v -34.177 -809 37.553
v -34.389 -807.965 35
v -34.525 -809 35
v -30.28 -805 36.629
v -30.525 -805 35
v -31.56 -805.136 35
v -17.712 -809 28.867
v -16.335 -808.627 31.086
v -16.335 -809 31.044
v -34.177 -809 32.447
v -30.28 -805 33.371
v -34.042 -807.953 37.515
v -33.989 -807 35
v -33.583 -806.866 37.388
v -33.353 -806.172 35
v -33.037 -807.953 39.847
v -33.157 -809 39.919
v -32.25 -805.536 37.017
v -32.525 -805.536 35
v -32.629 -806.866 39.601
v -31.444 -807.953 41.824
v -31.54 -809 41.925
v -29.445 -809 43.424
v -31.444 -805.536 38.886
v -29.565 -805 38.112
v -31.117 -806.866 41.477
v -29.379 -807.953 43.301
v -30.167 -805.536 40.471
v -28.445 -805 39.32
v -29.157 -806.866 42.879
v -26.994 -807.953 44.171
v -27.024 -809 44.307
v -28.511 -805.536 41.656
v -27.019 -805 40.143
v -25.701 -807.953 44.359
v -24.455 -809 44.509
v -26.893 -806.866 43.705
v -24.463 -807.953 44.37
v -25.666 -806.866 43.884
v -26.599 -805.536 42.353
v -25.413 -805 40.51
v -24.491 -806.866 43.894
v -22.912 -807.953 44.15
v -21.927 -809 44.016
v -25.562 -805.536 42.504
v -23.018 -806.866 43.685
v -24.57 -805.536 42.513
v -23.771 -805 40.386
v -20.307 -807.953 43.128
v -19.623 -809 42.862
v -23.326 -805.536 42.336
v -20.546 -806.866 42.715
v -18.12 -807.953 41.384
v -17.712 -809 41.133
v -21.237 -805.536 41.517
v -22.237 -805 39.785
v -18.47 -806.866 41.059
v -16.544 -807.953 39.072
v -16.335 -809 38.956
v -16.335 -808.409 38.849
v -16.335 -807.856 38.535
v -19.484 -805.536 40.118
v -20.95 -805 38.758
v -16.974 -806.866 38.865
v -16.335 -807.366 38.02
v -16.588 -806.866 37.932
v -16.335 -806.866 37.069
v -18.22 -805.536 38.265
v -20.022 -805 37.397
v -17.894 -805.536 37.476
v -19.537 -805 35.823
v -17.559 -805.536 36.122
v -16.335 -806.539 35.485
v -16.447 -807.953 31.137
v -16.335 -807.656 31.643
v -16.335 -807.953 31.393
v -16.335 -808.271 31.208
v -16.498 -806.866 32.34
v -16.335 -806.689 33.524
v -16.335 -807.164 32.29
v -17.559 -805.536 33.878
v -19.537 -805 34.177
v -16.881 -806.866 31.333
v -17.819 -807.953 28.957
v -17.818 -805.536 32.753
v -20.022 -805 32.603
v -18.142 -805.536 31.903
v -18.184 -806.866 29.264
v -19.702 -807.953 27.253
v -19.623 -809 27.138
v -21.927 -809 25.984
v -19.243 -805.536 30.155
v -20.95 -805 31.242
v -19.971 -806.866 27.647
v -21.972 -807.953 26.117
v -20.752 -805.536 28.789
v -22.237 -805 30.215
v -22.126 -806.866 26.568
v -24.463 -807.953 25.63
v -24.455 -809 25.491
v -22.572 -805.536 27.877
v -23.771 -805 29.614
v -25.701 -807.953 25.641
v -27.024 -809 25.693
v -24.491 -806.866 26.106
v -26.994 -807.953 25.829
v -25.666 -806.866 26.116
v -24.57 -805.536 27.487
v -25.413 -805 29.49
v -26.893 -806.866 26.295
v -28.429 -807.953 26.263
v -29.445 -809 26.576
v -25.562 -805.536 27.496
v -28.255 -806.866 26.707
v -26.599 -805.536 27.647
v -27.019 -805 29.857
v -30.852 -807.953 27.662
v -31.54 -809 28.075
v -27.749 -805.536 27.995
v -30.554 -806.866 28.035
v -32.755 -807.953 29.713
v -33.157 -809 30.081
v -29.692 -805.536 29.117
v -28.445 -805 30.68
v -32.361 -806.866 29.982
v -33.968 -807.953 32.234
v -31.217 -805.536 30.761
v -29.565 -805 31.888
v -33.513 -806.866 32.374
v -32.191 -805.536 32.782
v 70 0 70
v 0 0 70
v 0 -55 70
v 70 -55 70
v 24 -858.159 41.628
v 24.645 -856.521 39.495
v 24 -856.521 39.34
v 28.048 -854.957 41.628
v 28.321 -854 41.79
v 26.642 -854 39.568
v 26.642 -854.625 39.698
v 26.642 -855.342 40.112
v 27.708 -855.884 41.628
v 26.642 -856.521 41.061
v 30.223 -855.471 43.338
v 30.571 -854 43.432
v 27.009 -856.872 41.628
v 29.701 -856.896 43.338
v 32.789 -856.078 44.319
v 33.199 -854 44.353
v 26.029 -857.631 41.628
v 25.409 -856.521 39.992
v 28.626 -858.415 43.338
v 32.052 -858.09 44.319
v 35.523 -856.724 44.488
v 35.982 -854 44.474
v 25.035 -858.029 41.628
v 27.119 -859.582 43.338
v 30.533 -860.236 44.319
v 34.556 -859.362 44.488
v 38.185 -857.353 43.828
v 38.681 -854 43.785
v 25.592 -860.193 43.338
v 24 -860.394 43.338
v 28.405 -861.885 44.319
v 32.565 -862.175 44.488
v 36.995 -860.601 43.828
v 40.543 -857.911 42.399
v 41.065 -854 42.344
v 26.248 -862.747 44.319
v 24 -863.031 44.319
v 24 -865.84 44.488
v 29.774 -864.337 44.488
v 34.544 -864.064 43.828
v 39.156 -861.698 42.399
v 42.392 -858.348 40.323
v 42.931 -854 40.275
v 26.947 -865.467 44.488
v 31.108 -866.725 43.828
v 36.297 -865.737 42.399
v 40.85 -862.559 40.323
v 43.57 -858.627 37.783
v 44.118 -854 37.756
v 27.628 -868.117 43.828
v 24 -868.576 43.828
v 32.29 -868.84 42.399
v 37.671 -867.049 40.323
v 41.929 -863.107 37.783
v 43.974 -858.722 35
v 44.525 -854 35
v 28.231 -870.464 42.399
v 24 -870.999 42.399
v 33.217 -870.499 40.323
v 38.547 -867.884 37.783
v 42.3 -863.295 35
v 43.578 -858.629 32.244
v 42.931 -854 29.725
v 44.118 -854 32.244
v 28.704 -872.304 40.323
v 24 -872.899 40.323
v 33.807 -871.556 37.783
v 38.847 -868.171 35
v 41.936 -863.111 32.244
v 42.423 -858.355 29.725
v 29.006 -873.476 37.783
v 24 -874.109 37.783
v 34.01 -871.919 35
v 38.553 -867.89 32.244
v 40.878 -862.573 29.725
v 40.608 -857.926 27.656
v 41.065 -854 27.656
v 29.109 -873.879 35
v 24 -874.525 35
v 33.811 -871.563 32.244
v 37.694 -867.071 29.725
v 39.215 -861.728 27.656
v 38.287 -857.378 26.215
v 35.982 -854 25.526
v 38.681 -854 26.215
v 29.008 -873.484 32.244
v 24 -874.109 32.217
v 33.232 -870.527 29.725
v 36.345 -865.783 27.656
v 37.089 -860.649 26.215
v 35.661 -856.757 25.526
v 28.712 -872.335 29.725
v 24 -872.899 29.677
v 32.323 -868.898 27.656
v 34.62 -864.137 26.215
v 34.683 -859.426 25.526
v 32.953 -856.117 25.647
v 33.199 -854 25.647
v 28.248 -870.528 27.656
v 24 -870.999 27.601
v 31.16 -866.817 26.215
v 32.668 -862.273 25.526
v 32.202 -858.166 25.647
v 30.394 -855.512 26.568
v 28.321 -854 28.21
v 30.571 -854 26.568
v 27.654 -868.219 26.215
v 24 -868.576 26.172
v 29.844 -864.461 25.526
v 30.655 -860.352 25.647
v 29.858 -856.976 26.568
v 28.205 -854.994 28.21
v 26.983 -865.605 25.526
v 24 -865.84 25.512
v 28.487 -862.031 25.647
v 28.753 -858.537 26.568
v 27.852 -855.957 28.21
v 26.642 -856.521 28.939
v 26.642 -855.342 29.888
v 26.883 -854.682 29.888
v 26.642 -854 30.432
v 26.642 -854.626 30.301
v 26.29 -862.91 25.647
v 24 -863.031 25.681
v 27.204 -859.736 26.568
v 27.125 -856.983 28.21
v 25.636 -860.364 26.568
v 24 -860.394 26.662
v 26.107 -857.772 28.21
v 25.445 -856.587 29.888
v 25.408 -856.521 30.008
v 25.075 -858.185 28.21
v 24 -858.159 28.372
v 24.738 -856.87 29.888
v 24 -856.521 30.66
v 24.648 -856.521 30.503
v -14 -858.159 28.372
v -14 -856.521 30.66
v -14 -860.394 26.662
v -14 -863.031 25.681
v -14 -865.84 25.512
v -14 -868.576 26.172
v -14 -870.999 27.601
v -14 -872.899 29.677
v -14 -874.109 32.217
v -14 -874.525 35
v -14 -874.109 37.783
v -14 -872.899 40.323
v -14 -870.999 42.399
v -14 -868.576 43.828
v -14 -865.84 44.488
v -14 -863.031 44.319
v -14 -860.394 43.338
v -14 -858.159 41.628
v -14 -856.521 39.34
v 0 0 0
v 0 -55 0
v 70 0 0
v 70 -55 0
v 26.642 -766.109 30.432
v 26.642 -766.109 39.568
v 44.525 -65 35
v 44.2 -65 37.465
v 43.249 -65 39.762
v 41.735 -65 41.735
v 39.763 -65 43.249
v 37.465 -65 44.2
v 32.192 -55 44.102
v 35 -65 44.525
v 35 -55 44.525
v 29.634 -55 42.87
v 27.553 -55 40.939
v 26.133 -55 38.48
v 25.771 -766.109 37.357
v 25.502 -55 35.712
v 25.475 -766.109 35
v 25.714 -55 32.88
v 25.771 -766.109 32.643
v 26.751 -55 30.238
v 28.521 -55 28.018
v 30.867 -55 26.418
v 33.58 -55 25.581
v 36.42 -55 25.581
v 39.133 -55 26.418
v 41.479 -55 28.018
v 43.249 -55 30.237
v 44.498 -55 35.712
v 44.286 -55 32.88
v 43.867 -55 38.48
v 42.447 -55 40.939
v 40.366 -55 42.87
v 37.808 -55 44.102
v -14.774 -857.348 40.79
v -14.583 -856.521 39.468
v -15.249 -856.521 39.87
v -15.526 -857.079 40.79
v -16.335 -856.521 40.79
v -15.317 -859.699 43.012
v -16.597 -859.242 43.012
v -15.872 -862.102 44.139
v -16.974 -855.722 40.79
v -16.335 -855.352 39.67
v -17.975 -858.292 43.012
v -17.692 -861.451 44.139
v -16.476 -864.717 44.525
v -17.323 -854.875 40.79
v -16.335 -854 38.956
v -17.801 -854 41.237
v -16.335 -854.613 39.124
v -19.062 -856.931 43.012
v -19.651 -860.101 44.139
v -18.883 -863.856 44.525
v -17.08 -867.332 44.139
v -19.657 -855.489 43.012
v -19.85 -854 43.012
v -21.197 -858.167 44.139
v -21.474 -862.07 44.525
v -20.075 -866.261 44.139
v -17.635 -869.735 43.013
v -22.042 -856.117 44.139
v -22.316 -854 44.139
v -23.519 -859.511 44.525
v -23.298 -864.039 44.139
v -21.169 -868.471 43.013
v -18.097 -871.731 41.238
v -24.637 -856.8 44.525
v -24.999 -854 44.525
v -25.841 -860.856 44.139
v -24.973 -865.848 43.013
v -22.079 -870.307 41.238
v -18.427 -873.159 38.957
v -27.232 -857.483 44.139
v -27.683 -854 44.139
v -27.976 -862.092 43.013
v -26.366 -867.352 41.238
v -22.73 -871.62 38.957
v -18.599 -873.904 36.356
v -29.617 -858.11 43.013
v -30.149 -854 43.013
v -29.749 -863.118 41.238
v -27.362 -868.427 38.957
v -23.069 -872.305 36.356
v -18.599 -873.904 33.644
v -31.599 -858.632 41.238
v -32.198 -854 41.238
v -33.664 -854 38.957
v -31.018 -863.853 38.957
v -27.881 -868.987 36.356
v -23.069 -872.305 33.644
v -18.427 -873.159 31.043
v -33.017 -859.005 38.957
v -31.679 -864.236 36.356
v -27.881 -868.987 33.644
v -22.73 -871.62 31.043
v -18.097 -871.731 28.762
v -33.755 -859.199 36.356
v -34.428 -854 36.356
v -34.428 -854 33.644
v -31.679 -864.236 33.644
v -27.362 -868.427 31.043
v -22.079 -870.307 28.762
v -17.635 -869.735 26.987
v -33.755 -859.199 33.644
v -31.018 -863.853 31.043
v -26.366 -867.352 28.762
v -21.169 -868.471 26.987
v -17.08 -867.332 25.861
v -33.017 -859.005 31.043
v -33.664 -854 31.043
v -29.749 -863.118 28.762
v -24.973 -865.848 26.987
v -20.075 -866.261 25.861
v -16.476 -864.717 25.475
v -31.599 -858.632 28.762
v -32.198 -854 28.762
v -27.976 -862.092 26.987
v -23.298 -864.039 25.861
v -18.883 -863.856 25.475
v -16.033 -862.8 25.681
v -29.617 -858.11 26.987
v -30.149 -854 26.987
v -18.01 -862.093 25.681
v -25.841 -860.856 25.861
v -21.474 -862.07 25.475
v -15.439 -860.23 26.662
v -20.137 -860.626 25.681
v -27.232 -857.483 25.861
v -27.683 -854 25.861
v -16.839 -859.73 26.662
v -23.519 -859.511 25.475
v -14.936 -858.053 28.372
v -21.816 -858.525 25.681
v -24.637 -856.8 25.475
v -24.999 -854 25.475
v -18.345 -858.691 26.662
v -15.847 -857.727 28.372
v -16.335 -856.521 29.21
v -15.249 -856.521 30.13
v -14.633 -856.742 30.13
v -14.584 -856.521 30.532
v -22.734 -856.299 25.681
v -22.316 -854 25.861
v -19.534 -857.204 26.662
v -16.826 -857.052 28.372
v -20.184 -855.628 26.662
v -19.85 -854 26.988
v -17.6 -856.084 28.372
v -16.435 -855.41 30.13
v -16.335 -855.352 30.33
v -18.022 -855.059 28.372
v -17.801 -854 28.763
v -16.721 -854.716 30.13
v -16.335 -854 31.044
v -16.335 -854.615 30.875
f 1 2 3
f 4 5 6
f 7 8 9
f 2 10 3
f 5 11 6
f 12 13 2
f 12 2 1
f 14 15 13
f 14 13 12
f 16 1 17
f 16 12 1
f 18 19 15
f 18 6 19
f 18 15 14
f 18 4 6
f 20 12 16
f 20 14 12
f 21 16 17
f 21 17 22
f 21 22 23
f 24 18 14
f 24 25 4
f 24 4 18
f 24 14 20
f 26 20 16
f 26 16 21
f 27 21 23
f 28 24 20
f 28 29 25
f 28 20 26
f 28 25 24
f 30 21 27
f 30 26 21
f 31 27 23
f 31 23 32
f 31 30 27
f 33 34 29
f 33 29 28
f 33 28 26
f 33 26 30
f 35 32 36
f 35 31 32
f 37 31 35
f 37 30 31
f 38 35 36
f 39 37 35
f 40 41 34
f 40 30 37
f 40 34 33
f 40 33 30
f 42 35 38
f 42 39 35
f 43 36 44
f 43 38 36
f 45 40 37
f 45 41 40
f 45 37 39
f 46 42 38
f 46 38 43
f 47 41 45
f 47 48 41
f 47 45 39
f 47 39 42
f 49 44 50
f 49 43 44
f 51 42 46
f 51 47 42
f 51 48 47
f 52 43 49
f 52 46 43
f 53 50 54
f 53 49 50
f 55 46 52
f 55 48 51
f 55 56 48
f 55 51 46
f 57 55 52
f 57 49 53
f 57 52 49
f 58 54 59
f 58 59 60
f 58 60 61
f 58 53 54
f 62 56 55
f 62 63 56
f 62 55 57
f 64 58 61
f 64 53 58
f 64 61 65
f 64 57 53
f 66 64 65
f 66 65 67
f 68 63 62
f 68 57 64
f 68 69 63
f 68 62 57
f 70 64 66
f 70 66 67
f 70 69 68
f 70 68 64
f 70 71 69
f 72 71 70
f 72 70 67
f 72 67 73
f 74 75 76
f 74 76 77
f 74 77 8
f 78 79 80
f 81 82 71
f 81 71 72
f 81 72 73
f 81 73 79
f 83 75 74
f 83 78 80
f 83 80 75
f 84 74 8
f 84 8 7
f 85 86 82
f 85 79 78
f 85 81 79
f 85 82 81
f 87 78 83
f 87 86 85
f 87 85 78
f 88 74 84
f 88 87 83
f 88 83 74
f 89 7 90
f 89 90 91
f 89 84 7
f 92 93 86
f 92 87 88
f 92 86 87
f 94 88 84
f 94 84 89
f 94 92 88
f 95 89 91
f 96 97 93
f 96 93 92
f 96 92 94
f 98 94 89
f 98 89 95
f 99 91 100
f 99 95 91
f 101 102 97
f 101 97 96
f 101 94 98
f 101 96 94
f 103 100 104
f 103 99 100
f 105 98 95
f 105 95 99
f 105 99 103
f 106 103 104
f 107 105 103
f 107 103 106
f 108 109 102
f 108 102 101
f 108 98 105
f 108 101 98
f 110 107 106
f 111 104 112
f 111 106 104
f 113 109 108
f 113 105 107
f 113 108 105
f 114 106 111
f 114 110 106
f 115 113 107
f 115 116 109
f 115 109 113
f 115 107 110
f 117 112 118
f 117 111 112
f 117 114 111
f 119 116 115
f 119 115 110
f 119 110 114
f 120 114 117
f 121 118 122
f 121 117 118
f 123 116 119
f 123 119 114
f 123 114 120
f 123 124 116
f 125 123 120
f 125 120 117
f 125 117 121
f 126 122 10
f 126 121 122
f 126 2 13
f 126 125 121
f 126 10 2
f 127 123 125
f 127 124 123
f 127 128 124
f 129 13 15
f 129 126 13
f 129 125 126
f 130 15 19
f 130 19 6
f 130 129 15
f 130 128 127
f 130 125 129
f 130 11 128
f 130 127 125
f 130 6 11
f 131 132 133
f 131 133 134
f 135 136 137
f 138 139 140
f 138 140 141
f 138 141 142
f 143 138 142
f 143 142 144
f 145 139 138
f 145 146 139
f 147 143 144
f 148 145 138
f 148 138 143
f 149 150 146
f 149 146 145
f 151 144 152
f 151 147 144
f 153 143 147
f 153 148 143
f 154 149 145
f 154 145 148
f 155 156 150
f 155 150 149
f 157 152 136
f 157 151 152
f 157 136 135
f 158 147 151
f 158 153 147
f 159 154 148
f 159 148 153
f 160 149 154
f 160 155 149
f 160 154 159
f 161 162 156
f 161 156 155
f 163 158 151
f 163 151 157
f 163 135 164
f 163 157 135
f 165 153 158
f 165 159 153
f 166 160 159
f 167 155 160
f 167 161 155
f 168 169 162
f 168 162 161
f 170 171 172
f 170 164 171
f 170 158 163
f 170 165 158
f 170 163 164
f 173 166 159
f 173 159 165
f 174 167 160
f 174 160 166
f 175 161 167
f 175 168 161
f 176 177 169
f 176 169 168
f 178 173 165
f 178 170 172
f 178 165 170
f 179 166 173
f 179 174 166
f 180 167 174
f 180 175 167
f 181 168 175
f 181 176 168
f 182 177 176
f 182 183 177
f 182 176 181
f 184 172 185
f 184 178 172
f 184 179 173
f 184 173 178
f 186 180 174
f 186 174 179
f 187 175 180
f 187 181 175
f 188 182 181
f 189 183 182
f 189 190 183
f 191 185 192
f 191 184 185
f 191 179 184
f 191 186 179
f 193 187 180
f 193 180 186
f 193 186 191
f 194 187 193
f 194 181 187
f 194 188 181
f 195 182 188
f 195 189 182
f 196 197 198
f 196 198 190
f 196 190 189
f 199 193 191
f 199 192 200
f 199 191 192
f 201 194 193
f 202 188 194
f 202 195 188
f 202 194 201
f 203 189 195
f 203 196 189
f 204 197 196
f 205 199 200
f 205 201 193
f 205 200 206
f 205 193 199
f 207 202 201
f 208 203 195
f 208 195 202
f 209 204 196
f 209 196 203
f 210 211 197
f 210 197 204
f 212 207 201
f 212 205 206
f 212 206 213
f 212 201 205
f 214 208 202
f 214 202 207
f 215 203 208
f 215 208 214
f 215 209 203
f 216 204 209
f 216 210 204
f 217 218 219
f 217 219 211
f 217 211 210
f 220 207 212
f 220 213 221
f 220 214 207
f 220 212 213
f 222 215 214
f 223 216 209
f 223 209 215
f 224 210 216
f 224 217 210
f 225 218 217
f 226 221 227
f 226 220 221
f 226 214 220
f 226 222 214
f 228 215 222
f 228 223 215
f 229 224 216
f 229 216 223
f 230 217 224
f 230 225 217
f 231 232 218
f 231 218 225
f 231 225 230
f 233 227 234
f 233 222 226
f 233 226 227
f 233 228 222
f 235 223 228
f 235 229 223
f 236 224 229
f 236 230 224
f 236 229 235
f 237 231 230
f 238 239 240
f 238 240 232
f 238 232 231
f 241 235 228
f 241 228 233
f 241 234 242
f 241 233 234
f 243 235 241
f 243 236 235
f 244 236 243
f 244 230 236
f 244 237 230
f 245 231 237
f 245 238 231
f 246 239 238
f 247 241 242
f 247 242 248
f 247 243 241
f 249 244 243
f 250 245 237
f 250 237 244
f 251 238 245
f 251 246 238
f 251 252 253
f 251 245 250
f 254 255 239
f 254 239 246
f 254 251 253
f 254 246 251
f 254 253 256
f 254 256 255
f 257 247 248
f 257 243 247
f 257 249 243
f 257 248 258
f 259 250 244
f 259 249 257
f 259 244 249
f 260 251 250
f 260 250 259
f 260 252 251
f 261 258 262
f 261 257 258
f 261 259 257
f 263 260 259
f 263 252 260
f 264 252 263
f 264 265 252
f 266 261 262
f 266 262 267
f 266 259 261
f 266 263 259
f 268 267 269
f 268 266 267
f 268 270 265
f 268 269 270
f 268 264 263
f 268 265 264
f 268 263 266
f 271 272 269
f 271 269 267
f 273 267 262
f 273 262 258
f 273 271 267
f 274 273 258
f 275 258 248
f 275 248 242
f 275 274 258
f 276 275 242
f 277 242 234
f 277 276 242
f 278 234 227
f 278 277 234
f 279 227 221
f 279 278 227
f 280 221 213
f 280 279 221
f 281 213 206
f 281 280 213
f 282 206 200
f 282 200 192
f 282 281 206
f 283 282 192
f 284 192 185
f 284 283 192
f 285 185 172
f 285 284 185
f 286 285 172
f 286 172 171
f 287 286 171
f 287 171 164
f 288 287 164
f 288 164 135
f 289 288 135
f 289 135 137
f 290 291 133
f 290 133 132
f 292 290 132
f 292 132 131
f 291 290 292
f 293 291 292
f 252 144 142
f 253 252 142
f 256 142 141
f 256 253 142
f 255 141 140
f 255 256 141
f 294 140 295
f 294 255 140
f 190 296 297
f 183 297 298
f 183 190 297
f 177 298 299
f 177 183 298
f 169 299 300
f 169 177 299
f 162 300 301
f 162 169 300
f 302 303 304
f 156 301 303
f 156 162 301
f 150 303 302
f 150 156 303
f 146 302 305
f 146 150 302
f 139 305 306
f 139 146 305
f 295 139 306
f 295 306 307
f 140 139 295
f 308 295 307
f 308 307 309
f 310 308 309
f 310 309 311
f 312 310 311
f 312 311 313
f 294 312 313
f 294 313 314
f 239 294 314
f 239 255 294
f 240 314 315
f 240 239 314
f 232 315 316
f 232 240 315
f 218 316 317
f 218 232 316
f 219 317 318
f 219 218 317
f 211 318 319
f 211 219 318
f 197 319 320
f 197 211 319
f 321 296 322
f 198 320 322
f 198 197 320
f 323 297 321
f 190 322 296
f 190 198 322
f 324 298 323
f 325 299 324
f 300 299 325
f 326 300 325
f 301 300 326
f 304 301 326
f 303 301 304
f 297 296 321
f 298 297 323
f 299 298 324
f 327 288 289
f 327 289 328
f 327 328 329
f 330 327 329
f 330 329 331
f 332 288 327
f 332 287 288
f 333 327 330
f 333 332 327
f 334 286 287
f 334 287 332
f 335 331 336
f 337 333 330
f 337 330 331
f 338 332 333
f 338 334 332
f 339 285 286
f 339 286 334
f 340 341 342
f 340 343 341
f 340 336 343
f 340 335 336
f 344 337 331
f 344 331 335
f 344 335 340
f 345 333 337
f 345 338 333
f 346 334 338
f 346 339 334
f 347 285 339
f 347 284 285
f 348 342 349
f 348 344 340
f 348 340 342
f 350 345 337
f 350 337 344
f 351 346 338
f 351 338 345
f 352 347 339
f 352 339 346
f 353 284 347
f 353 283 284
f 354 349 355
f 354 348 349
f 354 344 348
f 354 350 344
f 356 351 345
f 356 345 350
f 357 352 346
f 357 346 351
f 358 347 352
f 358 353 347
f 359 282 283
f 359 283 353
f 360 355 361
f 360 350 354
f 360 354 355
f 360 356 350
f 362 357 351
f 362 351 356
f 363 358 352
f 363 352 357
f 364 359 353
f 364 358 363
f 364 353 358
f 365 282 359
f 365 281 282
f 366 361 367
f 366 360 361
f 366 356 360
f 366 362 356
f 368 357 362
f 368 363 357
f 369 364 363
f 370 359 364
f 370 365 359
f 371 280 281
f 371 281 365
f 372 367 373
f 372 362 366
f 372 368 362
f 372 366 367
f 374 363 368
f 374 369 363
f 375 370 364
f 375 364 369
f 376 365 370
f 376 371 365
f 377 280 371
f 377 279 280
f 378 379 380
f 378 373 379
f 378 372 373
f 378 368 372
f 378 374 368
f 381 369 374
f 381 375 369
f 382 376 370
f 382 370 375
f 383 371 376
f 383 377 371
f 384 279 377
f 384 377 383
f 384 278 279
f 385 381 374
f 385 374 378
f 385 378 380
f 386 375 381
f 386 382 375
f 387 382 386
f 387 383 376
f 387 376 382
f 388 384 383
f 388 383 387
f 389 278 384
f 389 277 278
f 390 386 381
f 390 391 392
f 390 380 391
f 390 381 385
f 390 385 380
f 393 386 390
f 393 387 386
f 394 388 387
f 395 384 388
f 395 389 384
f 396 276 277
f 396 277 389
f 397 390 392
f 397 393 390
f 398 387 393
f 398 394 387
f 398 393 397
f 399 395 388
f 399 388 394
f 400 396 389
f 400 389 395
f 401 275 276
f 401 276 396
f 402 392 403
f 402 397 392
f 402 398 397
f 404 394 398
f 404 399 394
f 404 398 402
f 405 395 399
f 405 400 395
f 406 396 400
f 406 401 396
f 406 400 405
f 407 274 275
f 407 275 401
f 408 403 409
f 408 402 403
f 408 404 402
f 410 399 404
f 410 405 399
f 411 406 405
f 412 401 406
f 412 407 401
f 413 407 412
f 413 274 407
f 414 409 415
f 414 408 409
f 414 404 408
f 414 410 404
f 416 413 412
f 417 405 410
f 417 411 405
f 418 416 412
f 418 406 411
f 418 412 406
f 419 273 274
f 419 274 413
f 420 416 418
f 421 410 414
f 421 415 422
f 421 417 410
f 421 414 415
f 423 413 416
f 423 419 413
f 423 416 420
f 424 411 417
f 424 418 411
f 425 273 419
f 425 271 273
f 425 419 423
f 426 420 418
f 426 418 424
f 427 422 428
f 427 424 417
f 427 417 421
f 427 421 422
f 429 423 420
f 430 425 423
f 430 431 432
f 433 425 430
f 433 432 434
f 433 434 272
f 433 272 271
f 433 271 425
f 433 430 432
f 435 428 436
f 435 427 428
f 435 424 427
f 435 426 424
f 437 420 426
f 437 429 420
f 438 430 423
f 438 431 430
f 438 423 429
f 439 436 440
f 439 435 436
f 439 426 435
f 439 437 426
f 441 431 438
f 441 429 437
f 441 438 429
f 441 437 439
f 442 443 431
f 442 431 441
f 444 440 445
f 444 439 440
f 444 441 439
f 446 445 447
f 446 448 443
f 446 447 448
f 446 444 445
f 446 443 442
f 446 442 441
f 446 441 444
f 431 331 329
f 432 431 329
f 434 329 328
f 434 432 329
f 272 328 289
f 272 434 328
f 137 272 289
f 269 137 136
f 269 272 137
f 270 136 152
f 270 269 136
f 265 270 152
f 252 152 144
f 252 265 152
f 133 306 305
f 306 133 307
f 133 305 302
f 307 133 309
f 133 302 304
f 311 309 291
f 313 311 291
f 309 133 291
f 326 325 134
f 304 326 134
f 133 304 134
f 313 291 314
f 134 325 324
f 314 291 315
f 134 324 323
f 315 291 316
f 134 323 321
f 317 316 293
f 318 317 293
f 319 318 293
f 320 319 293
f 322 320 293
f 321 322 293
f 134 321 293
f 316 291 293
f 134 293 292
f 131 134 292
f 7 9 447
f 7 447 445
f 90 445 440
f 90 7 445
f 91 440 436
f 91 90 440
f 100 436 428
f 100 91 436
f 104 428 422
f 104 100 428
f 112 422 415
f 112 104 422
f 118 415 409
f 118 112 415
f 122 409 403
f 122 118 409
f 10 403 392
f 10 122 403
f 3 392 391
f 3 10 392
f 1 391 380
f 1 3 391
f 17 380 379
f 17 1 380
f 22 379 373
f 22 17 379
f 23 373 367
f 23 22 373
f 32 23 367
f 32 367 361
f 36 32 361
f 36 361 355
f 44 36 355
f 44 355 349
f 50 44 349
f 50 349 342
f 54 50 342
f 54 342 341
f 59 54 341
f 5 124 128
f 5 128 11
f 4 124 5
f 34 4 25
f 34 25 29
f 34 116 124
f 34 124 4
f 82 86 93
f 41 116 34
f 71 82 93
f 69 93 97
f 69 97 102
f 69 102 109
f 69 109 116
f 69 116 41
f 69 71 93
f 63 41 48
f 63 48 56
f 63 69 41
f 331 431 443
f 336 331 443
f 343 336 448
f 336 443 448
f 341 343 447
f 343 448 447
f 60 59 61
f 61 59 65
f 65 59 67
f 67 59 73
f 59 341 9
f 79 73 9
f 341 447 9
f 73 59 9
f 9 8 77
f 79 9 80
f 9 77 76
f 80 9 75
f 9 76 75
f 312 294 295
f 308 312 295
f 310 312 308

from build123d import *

# Parameters (mm, degrees)
CROQUIS1_W              = 70
CROQUIS1_H              = 55
SALIENTE_EXTRUIR1_DEPTH = 70
CROQUIS2_R              = 9.525
SALIENTE_EXTRUIR2_DEPTH = 10
CROQUIS3_R              = 9.525
REDONDEO1_R             = 4
CROQUIS5_W              = 42.976896334
CROQUIS5_H              = 90.412198776
CORTAR_EXTRUIR2_DEPTH   = 70


with BuildPart() as part:
    # Croquis1 → Saliente-Extruir1 (new body)
    with BuildSketch(Plane.XY):
        with Locations((35, -27.5)):
            Rectangle(CROQUIS1_W, CROQUIS1_H)
    extrude(amount=SALIENTE_EXTRUIR1_DEPTH)

    # Croquis2 → Saliente-Extruir2 (add)
    with BuildSketch(Plane.XZ.offset(55)):
        with Locations(Location((35, 35, 0), (0, 0, 90))):
            Circle(CROQUIS2_R)
    extrude(amount=SALIENTE_EXTRUIR2_DEPTH)

    # Barrer1: sweep along a curve in space
    with BuildLine() as barrer1_path:
        Line((35, -65, 35), (35, -854, 35))
        ThreePointArc((35, -854, 35), (31.778174593, -861.778174593, 35), (24, -865, 35))
        Line((24, -865, 35), (-14, -865, 35))
        ThreePointArc((-14, -865, 35), (-21.778174593, -861.778174593, 35), (-25, -854, 35))
        Line((-25, -854, 35), (-25, -805, 35))
    # Croquis3 → Barrer1 (sweep)
    with BuildSketch(Plane.XZ.offset(65)):
        with Locations((35, 35)):
            Circle(CROQUIS3_R)
    sweep(path=barrer1_path.line)

    # Redondeo1
    redondeo1_edges = [part.edges().sort_by_distance(p)[0] for p in [
        (-15.475, -805, 35),
    ]]
    fillet(redondeo1_edges, radius=REDONDEO1_R)

    # Croquis5 → Cortar-Extruir2 (cut)
    with BuildSketch(Plane.XY):
        with Locations((5.153209537, -811.315289476)):
            Rectangle(CROQUIS5_W, CROQUIS5_H)
    extrude(amount=CORTAR_EXTRUIR2_DEPTH, mode=Mode.SUBTRACT)


solid = part.part
